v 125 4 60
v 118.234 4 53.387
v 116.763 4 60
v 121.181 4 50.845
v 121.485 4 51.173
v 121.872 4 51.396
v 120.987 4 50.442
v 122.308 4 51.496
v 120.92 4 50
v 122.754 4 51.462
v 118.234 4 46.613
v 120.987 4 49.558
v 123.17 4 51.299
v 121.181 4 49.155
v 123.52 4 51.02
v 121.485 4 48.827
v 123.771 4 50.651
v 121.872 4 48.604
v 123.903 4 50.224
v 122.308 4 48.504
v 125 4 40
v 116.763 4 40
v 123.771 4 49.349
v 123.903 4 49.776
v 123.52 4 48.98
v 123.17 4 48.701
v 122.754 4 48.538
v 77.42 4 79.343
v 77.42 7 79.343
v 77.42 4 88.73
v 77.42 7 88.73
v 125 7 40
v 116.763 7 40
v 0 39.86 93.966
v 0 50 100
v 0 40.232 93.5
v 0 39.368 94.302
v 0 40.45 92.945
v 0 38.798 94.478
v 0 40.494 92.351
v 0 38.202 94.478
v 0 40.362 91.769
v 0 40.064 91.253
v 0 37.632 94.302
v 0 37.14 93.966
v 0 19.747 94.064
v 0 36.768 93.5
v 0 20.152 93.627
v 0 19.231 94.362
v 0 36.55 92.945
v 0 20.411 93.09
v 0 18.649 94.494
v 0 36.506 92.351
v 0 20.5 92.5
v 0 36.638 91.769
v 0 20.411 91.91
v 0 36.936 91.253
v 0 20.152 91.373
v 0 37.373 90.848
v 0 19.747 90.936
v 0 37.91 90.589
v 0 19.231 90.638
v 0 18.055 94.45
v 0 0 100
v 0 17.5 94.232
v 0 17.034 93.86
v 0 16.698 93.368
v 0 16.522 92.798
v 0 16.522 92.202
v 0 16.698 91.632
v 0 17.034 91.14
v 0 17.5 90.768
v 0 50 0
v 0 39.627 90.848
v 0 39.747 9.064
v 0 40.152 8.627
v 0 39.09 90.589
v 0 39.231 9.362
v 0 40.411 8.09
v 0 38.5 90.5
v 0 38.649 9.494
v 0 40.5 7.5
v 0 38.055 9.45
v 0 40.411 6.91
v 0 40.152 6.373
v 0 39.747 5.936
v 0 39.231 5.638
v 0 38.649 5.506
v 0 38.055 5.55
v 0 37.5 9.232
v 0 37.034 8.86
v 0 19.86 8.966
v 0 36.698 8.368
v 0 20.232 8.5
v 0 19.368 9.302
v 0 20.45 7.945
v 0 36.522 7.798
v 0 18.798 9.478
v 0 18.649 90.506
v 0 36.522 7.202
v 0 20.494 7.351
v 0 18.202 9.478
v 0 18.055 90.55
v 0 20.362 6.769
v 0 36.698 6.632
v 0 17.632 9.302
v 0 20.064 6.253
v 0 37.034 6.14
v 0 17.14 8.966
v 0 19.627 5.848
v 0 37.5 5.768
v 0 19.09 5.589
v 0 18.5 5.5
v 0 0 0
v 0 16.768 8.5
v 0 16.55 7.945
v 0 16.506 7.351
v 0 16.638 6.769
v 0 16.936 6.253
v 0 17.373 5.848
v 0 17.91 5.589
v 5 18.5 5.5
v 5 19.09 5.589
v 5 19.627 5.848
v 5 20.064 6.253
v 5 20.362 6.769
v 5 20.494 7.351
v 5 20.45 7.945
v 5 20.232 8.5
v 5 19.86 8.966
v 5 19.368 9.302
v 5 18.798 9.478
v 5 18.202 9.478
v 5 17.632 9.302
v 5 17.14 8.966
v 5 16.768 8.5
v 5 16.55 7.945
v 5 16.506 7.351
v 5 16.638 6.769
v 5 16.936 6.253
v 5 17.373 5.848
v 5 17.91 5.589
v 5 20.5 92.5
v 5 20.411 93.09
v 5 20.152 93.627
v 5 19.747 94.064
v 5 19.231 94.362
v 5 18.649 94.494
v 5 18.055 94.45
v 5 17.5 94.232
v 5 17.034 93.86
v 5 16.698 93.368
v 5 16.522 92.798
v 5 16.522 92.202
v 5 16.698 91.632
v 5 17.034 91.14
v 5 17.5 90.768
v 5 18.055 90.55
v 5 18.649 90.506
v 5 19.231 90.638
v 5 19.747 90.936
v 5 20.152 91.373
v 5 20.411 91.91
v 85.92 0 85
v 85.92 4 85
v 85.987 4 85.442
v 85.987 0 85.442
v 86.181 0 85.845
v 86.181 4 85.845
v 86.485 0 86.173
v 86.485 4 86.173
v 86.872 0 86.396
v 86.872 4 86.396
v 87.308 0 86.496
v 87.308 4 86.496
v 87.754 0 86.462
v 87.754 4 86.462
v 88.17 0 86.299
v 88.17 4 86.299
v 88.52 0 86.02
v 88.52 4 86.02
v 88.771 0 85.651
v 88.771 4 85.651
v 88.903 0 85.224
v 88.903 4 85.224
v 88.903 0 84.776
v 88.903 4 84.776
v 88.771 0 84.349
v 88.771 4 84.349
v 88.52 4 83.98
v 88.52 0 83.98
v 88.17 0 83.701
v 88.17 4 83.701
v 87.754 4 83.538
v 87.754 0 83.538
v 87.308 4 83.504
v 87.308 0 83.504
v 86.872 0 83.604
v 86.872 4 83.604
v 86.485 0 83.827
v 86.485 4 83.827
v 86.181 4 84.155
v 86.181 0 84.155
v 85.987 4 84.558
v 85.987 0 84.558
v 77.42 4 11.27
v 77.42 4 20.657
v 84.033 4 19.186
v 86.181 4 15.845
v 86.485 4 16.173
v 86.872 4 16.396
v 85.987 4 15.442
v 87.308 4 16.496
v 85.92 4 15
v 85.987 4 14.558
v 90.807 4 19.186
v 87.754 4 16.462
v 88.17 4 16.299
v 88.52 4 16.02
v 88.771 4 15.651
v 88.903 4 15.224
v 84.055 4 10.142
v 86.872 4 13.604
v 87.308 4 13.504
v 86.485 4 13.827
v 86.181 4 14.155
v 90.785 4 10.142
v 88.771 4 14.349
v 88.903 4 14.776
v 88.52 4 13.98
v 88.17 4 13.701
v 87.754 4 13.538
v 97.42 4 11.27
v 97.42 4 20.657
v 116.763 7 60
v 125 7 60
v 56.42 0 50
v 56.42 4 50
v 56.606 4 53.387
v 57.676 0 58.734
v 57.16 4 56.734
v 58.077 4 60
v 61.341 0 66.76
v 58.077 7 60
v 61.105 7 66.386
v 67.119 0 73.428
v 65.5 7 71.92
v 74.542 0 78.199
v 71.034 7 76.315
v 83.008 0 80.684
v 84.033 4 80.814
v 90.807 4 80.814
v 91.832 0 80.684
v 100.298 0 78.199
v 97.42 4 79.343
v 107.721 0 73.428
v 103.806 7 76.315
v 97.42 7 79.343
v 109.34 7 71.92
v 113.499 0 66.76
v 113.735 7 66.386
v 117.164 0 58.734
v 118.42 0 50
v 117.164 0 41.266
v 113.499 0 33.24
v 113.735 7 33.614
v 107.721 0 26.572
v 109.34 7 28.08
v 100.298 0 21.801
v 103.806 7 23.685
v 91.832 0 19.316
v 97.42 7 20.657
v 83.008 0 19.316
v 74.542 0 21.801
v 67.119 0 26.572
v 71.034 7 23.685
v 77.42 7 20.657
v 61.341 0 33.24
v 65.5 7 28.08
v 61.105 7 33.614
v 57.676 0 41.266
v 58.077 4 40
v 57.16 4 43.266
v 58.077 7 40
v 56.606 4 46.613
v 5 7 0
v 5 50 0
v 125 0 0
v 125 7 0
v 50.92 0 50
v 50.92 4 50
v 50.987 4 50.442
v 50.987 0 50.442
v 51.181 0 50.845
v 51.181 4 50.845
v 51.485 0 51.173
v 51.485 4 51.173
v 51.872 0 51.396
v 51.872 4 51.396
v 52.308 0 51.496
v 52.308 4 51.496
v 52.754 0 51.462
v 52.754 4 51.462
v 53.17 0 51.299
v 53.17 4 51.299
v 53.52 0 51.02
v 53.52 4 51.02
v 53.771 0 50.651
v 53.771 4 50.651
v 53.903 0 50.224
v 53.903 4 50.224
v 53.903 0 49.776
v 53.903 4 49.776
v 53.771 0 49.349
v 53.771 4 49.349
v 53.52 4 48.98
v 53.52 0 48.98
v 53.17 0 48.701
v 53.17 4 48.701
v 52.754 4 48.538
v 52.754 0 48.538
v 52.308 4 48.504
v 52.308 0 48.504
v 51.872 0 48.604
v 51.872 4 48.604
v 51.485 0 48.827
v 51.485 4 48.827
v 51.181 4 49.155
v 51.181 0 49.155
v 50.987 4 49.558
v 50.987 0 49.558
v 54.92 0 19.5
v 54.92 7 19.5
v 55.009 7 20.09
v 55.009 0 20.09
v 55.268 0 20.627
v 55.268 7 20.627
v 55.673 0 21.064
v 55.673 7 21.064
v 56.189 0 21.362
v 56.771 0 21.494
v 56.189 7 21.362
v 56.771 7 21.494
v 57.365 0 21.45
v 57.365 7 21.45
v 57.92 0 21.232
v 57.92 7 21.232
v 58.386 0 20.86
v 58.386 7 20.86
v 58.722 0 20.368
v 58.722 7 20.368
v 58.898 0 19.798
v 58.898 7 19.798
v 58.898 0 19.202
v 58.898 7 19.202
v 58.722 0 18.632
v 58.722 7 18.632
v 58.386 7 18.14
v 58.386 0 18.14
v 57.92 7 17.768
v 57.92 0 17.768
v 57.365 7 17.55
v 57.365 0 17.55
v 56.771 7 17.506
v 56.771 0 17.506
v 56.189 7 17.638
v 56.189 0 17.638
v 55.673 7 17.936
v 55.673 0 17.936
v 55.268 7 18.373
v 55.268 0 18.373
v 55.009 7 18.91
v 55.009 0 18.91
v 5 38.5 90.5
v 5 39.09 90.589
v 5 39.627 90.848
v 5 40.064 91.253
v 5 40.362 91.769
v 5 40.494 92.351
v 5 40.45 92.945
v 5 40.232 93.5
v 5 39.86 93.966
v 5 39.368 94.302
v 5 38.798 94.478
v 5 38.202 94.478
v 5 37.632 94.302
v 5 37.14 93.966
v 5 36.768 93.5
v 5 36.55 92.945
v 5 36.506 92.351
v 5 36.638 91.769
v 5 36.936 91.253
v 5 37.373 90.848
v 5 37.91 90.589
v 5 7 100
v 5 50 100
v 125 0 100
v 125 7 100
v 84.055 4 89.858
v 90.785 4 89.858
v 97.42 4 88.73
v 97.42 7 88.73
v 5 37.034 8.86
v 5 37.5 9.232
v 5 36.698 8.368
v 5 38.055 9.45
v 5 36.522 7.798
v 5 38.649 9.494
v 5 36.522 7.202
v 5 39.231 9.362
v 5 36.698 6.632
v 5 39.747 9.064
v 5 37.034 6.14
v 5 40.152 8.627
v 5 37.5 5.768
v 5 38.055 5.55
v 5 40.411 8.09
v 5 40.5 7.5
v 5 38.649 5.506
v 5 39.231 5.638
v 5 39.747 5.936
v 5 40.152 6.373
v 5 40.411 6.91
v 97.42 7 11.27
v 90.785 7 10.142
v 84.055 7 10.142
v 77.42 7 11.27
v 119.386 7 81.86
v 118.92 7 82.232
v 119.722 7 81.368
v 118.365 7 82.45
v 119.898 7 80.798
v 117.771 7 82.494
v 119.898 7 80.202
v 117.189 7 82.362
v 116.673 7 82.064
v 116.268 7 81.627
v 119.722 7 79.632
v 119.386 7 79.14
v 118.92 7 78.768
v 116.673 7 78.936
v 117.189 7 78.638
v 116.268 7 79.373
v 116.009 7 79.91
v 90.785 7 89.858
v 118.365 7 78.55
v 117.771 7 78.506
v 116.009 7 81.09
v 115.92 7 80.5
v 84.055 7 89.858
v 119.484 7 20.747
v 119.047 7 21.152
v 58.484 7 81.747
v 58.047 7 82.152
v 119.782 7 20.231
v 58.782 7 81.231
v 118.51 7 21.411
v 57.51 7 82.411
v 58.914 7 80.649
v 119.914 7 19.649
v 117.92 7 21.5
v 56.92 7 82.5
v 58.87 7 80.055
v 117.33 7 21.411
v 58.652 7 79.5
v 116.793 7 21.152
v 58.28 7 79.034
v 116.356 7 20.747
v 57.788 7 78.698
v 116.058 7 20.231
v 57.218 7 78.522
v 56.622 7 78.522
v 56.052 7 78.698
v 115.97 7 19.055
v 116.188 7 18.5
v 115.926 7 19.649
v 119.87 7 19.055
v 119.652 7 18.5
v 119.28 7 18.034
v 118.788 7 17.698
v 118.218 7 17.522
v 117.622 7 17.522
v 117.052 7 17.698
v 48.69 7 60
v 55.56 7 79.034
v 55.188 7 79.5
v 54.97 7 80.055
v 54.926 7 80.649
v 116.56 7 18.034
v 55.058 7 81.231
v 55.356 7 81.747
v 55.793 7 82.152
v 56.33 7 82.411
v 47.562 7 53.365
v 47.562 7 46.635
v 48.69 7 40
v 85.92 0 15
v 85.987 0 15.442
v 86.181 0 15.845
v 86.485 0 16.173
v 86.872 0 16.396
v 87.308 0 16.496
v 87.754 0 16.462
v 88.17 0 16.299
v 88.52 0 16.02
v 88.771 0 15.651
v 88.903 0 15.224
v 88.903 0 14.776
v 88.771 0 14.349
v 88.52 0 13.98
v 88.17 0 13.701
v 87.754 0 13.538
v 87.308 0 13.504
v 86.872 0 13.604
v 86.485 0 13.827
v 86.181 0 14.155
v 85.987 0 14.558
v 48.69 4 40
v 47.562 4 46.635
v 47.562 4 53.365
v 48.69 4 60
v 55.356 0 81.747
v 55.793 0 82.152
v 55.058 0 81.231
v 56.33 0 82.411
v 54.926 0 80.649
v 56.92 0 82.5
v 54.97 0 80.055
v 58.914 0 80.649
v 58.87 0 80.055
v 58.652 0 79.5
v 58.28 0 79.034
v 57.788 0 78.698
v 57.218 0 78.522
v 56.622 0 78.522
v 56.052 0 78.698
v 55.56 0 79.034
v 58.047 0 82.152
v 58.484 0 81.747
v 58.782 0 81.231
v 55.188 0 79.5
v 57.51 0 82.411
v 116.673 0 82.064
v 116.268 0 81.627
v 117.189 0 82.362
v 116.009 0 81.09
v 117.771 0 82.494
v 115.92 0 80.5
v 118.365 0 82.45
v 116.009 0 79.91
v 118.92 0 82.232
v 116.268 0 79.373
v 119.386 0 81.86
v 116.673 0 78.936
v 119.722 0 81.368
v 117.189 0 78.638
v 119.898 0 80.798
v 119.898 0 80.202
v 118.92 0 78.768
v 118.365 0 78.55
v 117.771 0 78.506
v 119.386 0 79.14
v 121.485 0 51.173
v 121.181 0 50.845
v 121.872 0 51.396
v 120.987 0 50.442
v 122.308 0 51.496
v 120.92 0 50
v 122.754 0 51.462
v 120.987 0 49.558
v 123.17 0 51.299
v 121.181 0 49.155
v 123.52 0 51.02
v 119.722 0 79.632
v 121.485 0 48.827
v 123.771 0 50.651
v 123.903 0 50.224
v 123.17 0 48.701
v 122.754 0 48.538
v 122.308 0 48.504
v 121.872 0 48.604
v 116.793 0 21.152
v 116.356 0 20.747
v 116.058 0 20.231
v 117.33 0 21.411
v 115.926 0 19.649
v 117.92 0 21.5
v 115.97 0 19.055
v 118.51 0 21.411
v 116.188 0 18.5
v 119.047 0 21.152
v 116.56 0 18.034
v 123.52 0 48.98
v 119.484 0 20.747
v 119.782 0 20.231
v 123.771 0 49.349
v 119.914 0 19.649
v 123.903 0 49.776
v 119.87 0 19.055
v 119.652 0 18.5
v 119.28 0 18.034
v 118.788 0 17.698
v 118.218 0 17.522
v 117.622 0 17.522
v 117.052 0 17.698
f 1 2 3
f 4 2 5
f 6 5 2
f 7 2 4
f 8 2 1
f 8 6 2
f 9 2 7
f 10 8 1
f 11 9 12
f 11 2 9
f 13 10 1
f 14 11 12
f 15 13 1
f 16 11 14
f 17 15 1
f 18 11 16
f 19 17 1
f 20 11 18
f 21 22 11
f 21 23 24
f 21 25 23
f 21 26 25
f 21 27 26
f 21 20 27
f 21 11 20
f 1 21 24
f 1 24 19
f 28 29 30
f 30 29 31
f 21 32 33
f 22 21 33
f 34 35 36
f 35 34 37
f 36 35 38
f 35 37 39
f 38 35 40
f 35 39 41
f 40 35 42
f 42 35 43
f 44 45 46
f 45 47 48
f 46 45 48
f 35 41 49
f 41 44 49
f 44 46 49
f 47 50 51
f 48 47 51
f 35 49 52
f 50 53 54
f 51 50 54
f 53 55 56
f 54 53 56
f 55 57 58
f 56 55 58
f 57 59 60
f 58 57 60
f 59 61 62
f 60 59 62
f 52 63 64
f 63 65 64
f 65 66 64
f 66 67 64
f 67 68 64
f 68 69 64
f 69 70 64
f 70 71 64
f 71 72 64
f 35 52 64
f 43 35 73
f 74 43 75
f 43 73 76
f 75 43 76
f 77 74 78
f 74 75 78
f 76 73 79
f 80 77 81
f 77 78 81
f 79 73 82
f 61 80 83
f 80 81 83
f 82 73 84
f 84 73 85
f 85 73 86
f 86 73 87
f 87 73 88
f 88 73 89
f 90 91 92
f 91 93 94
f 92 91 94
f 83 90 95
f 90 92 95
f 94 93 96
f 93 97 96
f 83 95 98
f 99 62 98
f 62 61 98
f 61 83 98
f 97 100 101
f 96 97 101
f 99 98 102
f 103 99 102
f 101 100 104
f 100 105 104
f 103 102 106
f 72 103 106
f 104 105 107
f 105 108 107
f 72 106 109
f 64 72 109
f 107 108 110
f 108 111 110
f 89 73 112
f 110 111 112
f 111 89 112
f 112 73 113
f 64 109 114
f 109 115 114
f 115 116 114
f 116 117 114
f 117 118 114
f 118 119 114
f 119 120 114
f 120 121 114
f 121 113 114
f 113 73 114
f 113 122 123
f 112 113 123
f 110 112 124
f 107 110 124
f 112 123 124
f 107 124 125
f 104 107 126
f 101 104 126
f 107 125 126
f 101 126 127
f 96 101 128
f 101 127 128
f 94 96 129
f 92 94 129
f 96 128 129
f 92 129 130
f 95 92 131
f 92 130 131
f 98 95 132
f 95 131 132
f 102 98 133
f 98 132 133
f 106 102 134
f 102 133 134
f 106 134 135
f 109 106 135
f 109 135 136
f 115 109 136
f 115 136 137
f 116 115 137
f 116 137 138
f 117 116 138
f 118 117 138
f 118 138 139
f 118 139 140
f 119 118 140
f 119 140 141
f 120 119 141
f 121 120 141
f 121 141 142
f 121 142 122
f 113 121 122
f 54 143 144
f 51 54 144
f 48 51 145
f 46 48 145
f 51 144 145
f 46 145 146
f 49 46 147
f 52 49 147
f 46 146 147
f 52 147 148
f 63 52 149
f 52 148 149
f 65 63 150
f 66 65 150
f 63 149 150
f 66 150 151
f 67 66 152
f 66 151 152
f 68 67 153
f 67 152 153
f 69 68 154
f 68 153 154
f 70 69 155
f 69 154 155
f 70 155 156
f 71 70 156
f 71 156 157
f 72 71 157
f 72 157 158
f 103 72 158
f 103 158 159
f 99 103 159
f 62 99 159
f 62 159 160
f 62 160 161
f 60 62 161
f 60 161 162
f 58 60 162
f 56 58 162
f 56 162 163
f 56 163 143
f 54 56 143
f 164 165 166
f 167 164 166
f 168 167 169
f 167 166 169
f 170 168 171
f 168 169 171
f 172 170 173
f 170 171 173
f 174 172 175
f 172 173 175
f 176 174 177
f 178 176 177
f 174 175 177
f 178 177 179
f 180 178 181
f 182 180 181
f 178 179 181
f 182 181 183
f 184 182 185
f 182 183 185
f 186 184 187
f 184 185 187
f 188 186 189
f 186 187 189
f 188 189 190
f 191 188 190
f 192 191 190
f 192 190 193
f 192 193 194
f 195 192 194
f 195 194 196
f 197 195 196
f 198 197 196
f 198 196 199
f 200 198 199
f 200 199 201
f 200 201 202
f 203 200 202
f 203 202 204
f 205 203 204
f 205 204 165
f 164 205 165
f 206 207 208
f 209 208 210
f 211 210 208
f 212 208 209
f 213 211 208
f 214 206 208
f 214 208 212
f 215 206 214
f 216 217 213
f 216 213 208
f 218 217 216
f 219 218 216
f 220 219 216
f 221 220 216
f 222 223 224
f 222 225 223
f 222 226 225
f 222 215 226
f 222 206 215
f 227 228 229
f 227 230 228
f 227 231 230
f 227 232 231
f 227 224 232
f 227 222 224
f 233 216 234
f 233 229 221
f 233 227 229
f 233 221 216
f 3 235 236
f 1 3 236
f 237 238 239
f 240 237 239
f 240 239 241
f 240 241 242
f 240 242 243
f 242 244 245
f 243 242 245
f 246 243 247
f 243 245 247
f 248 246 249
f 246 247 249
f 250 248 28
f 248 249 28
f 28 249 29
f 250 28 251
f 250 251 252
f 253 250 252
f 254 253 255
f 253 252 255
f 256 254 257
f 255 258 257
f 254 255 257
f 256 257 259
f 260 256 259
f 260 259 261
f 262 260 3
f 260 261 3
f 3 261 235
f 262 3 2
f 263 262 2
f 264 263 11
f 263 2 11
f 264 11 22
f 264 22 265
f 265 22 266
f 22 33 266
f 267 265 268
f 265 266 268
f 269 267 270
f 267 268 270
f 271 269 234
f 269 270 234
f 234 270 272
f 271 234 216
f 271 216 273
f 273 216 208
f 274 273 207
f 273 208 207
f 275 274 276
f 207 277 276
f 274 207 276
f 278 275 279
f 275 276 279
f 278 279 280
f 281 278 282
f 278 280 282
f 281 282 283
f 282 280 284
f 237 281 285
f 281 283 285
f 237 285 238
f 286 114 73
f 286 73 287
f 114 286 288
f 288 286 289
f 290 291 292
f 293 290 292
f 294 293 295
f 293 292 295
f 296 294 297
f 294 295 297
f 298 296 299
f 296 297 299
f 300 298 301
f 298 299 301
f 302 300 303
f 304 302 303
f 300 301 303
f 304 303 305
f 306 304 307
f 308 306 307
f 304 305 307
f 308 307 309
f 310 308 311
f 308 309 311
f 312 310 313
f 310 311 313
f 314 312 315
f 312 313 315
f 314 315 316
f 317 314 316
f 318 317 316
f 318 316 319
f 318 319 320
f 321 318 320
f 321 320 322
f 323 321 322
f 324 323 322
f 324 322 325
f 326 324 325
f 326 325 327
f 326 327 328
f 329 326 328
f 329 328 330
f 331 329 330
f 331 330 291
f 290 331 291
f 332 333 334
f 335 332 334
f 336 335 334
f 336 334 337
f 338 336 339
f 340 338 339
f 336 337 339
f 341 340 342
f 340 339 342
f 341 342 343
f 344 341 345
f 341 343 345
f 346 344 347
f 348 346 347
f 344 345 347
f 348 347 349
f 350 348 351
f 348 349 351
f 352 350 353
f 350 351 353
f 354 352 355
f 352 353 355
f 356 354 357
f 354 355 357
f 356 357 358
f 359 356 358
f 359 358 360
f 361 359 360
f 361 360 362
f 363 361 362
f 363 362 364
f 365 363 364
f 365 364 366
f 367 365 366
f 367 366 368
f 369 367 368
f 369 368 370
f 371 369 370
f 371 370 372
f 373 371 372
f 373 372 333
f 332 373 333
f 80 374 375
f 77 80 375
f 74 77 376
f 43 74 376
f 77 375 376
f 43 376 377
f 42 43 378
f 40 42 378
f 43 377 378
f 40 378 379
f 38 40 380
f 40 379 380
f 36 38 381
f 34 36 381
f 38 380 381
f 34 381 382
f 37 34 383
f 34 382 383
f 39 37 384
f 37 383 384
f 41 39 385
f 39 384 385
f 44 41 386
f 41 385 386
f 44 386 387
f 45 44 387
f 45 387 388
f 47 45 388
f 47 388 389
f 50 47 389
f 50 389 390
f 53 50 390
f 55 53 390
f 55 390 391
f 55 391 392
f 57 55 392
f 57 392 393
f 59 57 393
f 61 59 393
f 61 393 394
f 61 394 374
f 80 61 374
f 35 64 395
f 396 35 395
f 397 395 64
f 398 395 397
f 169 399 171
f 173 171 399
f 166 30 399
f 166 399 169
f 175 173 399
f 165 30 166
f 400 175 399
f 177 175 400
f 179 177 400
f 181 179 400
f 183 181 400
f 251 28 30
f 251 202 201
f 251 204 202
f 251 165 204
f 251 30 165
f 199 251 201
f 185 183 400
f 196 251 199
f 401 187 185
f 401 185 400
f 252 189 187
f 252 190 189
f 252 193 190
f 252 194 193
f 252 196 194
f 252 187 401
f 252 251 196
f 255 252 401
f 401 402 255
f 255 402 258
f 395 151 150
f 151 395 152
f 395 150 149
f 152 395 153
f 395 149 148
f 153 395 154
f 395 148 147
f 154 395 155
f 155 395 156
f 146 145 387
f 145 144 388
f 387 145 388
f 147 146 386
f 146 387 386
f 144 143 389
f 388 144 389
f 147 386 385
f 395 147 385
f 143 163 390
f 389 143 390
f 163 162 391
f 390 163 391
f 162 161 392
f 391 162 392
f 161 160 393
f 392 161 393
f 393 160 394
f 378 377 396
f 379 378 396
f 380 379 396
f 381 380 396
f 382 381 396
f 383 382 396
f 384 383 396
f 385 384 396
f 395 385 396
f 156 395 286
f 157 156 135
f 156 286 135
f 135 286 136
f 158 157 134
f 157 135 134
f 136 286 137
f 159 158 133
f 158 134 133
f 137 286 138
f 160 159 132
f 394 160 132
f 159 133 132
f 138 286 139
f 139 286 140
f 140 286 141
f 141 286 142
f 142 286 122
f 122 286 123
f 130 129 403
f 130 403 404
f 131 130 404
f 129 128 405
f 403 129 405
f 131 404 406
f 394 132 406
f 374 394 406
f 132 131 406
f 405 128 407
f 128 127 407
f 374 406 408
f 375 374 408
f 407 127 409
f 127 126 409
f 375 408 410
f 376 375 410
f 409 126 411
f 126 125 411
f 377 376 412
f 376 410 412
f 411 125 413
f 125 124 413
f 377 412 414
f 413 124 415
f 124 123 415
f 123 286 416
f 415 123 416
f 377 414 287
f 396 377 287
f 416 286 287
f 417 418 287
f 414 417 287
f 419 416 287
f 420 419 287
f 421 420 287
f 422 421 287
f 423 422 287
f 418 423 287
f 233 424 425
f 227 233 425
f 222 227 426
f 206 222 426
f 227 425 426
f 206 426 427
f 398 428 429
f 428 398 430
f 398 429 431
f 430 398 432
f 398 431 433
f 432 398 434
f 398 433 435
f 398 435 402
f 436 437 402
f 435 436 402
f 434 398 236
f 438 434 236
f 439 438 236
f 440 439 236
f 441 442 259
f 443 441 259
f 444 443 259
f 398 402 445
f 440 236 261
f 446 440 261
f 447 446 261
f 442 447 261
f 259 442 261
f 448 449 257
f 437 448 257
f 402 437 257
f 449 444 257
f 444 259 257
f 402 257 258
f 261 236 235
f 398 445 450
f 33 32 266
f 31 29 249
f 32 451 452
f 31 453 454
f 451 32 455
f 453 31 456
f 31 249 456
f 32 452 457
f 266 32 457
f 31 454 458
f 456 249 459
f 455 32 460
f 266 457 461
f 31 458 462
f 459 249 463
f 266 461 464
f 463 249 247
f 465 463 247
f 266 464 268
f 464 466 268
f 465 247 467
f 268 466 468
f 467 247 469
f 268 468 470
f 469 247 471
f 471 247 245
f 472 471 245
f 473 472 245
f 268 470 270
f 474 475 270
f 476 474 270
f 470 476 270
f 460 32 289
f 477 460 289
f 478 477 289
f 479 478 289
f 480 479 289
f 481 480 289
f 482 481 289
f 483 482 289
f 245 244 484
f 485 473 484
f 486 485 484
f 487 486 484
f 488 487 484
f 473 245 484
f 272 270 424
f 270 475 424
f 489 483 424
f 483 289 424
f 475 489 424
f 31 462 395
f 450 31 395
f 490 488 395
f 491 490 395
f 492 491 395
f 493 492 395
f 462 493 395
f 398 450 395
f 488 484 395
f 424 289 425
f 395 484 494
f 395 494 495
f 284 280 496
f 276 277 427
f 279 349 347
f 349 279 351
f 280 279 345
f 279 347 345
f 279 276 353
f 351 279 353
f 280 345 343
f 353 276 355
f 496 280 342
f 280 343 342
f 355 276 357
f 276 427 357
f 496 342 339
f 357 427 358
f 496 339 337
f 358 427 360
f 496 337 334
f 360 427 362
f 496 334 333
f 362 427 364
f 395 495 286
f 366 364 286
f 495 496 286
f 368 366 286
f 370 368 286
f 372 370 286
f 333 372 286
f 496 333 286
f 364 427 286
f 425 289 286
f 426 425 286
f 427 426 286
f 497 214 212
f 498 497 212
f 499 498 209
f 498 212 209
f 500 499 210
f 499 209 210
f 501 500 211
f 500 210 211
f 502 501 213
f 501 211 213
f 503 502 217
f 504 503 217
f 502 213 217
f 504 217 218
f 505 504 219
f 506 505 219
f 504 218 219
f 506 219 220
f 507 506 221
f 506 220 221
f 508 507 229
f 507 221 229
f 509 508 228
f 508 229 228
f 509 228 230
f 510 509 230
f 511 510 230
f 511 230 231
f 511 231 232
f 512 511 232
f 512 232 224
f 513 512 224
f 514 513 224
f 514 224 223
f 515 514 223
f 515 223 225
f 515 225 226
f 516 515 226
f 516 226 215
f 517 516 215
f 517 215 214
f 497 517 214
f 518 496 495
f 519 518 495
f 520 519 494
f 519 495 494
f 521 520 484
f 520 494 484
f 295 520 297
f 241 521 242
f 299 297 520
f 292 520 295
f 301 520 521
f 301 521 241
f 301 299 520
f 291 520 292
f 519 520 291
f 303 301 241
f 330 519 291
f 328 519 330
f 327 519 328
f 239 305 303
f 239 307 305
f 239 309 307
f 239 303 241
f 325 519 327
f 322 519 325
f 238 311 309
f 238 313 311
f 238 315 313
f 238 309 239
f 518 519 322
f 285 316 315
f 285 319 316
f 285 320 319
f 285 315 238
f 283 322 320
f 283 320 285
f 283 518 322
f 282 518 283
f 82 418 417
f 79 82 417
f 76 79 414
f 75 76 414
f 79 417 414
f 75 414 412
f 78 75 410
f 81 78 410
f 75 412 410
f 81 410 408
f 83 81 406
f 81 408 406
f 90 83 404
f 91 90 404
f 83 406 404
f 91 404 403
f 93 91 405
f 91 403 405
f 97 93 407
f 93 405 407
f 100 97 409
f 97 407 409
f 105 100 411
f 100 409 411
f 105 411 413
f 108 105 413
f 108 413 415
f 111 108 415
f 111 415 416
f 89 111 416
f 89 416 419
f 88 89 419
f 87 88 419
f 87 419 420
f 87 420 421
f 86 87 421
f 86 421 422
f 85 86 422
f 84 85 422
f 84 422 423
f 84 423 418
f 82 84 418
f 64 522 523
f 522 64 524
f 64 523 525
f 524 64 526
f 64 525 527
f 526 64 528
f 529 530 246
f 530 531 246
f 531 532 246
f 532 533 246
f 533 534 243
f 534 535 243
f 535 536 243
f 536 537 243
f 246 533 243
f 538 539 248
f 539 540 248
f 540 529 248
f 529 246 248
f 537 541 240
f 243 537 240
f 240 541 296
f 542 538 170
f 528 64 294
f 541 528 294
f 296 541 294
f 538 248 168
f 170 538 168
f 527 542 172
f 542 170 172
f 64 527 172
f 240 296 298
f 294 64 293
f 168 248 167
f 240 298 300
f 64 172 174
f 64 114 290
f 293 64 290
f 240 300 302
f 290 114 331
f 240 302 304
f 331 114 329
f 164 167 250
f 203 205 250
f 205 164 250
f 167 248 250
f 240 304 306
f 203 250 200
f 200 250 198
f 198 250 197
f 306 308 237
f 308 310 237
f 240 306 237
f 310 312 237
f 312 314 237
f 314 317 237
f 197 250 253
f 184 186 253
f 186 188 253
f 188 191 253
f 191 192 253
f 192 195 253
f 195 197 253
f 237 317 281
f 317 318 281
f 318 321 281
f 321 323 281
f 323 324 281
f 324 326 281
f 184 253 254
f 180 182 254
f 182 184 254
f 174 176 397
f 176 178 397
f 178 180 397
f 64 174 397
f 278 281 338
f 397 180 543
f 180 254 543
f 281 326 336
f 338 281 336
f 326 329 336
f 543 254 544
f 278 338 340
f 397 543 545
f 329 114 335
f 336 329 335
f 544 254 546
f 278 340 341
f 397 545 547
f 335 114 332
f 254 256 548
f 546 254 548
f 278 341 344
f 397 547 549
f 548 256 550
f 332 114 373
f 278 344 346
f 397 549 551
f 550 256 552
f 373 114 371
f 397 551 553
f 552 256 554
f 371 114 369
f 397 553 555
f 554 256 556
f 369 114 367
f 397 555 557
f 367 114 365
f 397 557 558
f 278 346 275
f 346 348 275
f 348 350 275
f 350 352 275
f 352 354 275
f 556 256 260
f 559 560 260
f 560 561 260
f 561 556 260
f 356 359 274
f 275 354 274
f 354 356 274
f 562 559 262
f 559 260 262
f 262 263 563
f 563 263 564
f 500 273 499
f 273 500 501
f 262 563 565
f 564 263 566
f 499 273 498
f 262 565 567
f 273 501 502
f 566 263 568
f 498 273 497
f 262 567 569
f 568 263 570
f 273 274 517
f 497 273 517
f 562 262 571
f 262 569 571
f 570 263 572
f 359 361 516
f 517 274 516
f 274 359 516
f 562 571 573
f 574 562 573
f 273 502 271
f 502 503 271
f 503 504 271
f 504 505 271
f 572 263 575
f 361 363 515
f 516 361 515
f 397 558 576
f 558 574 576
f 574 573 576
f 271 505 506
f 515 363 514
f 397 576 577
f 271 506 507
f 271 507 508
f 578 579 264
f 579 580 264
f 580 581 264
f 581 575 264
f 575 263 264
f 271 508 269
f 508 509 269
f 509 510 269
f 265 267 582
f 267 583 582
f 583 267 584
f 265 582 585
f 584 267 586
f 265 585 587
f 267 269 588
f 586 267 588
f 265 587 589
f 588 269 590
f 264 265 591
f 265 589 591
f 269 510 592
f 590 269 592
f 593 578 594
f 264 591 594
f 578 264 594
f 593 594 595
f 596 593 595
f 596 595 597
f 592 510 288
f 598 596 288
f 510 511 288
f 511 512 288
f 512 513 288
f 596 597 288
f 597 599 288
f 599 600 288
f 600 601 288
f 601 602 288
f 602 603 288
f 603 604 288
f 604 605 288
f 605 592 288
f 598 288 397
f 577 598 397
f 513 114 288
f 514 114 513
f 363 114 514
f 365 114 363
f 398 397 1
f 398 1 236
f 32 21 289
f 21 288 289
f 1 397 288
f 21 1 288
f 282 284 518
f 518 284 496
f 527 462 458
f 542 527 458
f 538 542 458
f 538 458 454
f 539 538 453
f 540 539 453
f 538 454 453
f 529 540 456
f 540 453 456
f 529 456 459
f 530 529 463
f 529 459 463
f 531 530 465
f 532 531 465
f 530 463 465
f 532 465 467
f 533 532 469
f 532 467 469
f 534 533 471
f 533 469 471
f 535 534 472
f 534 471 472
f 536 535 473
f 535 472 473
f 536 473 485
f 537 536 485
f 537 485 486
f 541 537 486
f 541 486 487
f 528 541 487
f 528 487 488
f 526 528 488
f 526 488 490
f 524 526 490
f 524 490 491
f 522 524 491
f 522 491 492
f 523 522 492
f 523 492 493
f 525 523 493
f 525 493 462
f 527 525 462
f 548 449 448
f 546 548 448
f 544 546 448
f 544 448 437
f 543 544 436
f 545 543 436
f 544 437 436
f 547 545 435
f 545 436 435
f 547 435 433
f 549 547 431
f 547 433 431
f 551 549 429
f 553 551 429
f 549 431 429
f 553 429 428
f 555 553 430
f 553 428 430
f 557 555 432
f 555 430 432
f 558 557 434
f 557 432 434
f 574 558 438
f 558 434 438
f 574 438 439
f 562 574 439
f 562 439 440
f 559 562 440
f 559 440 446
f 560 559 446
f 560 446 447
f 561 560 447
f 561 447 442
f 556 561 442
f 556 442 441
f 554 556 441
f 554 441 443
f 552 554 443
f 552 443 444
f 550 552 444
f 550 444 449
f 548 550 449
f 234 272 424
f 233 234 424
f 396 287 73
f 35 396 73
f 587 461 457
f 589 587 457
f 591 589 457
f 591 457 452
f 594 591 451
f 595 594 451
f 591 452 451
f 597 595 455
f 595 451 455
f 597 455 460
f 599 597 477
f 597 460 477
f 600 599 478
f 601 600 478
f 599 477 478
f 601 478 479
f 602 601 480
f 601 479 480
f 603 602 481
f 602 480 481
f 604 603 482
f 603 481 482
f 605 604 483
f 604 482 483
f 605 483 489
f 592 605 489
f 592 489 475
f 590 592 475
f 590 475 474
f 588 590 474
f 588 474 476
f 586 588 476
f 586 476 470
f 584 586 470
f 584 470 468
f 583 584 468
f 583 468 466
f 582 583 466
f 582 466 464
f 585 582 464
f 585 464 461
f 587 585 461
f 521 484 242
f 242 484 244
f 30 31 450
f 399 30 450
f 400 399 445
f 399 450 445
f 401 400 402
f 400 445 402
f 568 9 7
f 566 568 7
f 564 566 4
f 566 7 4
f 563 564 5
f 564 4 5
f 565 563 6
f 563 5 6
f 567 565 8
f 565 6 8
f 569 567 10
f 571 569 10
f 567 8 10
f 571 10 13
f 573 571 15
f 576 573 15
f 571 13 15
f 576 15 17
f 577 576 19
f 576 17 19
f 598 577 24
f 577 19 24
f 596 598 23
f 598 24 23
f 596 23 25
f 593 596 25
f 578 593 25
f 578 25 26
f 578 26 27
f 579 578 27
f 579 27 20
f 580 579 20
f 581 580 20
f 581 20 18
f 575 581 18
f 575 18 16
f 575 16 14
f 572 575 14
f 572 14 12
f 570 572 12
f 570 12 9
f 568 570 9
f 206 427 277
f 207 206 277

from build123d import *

# Parameters (mm, degrees)
BOSS_EXTRUDE1_DEPTH = 100
CUT_EXTRUDE1_REACH  = 167.753
SKETCH2_R           = 31
SKETCH2_R_2         = 2
CUT_EXTRUDE2_REACH  = 166.012
SKETCH3_R           = 2
CUT_EXTRUDE3_DEPTH  = 3
CUT_EXTRUDE4_REACH  = 168.556
SKETCH6_R           = 1.5


with BuildPart() as part:
    # Sketch1 → Boss-Extrude1 (new body)
    with BuildSketch(Plane.XY):
        Polygon((0, 0), (125, 0), (125, 7), (5, 7), (5, 50), (0, 50), align=None)
    extrude(amount=BOSS_EXTRUDE1_DEPTH)

    # Sketch2 → Cut-Extrude1 (cut, up to next)
    with BuildSketch(Plane(origin=(0, 7, 0), x_dir=(1, 0, 0), z_dir=(0, 1, 0)), mode=Mode.PRIVATE) as cut_extrude1_sk1:
        with Locations(Location((87.42, -50, 0), (0, 0, 180))):
            Circle(SKETCH2_R)
    cut_extrude1_tool1 = extrude(cut_extrude1_sk1.sketch, amount=-CUT_EXTRUDE1_REACH, mode=Mode.PRIVATE) & part.part
    # Sketch2 → Cut-Extrude1 (cut, up to next)
    with BuildSketch(Plane(origin=(0, 7, 0), x_dir=(1, 0, 0), z_dir=(0, 1, 0)), mode=Mode.PRIVATE) as cut_extrude1_sk2:
        with Locations(Location((56.92, -19.5, 0), (0, 0, 180))):
            Circle(SKETCH2_R_2)
    cut_extrude1_tool2 = extrude(cut_extrude1_sk2.sketch, amount=-CUT_EXTRUDE1_REACH, mode=Mode.PRIVATE) & part.part
    # Sketch2 → Cut-Extrude1 (cut, up to next)
    with BuildSketch(Plane(origin=(0, 7, 0), x_dir=(1, 0, 0), z_dir=(0, 1, 0)), mode=Mode.PRIVATE) as cut_extrude1_sk3:
        with Locations(Location((56.92, -80.5, 0), (0, 0, 270))):
            Circle(SKETCH2_R_2)
    cut_extrude1_tool3 = extrude(cut_extrude1_sk3.sketch, amount=-CUT_EXTRUDE1_REACH, mode=Mode.PRIVATE) & part.part
    # Sketch2 → Cut-Extrude1 (cut, up to next)
    with BuildSketch(Plane(origin=(0, 7, 0), x_dir=(1, 0, 0), z_dir=(0, 1, 0)), mode=Mode.PRIVATE) as cut_extrude1_sk4:
        with Locations(Location((117.92, -19.5, 0), (0, 0, 270))):
            Circle(SKETCH2_R_2)
    cut_extrude1_tool4 = extrude(cut_extrude1_sk4.sketch, amount=-CUT_EXTRUDE1_REACH, mode=Mode.PRIVATE) & part.part
    # Sketch2 → Cut-Extrude1 (cut, up to next)
    with BuildSketch(Plane(origin=(0, 7, 0), x_dir=(1, 0, 0), z_dir=(0, 1, 0)), mode=Mode.PRIVATE) as cut_extrude1_sk5:
        with Locations(Location((117.92, -80.5, 0), (0, 0, 180))):
            Circle(SKETCH2_R_2)
    cut_extrude1_tool5 = extrude(cut_extrude1_sk5.sketch, amount=-CUT_EXTRUDE1_REACH, mode=Mode.PRIVATE) & part.part
    add(cut_extrude1_tool1.solids().sort_by_distance((87.42, 7, 50))[0], mode=Mode.SUBTRACT)
    add(cut_extrude1_tool2.solids().sort_by_distance((56.92, 7, 19.5))[0], mode=Mode.SUBTRACT)
    add(cut_extrude1_tool3.solids().sort_by_distance((56.92, 7, 80.5))[0], mode=Mode.SUBTRACT)
    add(cut_extrude1_tool4.solids().sort_by_distance((117.92, 7, 19.5))[0], mode=Mode.SUBTRACT)
    add(cut_extrude1_tool5.solids().sort_by_distance((117.92, 7, 80.5))[0], mode=Mode.SUBTRACT)

    # Sketch3 → Cut-Extrude2 (cut, up to next)
    with BuildSketch(Plane(origin=(5, 0, 0), x_dir=(0, 0, -1), z_dir=(1, 0, 0)), mode=Mode.PRIVATE) as cut_extrude2_sk1:
        with Locations((-92.5, 38.5)):
            Circle(SKETCH3_R)
    cut_extrude2_tool1 = extrude(cut_extrude2_sk1.sketch, amount=-CUT_EXTRUDE2_REACH, mode=Mode.PRIVATE) & part.part
    # Sketch3 → Cut-Extrude2 (cut, up to next)
    with BuildSketch(Plane(origin=(5, 0, 0), x_dir=(0, 0, -1), z_dir=(1, 0, 0)), mode=Mode.PRIVATE) as cut_extrude2_sk2:
        with Locations(Location((-92.5, 18.5, 0), (0, 0, 90))):
            Circle(SKETCH3_R)
    cut_extrude2_tool2 = extrude(cut_extrude2_sk2.sketch, amount=-CUT_EXTRUDE2_REACH, mode=Mode.PRIVATE) & part.part
    # Sketch3 → Cut-Extrude2 (cut, up to next)
    with BuildSketch(Plane(origin=(5, 0, 0), x_dir=(0, 0, -1), z_dir=(1, 0, 0)), mode=Mode.PRIVATE) as cut_extrude2_sk3:
        with Locations(Location((-7.5, 38.5, 0), (0, 0, 90))):
            Circle(SKETCH3_R)
    cut_extrude2_tool3 = extrude(cut_extrude2_sk3.sketch, amount=-CUT_EXTRUDE2_REACH, mode=Mode.PRIVATE) & part.part
    # Sketch3 → Cut-Extrude2 (cut, up to next)
    with BuildSketch(Plane(origin=(5, 0, 0), x_dir=(0, 0, -1), z_dir=(1, 0, 0)), mode=Mode.PRIVATE) as cut_extrude2_sk4:
        with Locations((-7.5, 18.5)):
            Circle(SKETCH3_R)
    cut_extrude2_tool4 = extrude(cut_extrude2_sk4.sketch, amount=-CUT_EXTRUDE2_REACH, mode=Mode.PRIVATE) & part.part
    add(cut_extrude2_tool1.solids().sort_by_distance((5, 38.5, 92.5))[0], mode=Mode.SUBTRACT)
    add(cut_extrude2_tool2.solids().sort_by_distance((5, 18.5, 92.5))[0], mode=Mode.SUBTRACT)
    add(cut_extrude2_tool3.solids().sort_by_distance((5, 38.5, 7.5))[0], mode=Mode.SUBTRACT)
    add(cut_extrude2_tool4.solids().sort_by_distance((5, 18.5, 7.5))[0], mode=Mode.SUBTRACT)

    # Sketch4 → Cut-Extrude3 (cut)
    with BuildSketch(Plane(origin=(0, 7, 0), x_dir=(1, 0, 0), z_dir=(0, 1, 0))):
        with BuildLine():
            Line((97.42, -20.657198498), (97.42, -11.270166538))
            ThreePointArc((97.42, -11.270166538), (87.42, -10), (77.42, -11.270166538))
            Line((77.42, -11.270166538), (77.42, -20.657198498))
            ThreePointArc((77.42, -20.657198498), (87.42, -19), (97.42, -20.657198498))
        make_face()
        with BuildLine():
            Line((116.762801502, -60), (126.149833462, -60))
            ThreePointArc((126.149833462, -60), (127.42, -50), (126.149833462, -40))
            Line((126.149833462, -40), (116.762801502, -40))
            ThreePointArc((116.762801502, -40), (118.42, -50), (116.762801502, -60))
        make_face()
        with BuildLine():
            Line((77.42, -79.342801502), (77.42, -88.729833462))
            ThreePointArc((77.42, -88.729833462), (87.42, -90), (97.42, -88.729833462))
            Line((97.42, -88.729833462), (97.42, -79.342801502))
            ThreePointArc((97.42, -79.342801502), (87.42, -81), (77.42, -79.342801502))
        make_face()
        with BuildLine():
            Line((58.077198498, -40), (48.690166538, -40))
            ThreePointArc((48.690166538, -40), (47.42, -50), (48.690166538, -60))
            Line((48.690166538, -60), (58.077198498, -60))
            ThreePointArc((58.077198498, -60), (56.42, -50), (58.077198498, -40))
        make_face()
    extrude(amount=-CUT_EXTRUDE3_DEPTH, mode=Mode.SUBTRACT)

    # Sketch6 → Cut-Extrude4 (cut, up to next)
    with BuildSketch(Plane(origin=(0, 4, 0), x_dir=(1, 0, 0), z_dir=(0, 1, 0)), mode=Mode.PRIVATE) as cut_extrude4_sk1:
        with Locations(Location((87.42, -15, 0), (0, 0, 180))):
            Circle(SKETCH6_R)
    cut_extrude4_tool1 = extrude(cut_extrude4_sk1.sketch, amount=-CUT_EXTRUDE4_REACH, mode=Mode.PRIVATE) & part.part
    # Sketch6 → Cut-Extrude4 (cut, up to next)
    with BuildSketch(Plane(origin=(0, 4, 0), x_dir=(1, 0, 0), z_dir=(0, 1, 0)), mode=Mode.PRIVATE) as cut_extrude4_sk2:
        with Locations(Location((122.42, -50, 0), (0, 0, 180))):
            Circle(SKETCH6_R)
    cut_extrude4_tool2 = extrude(cut_extrude4_sk2.sketch, amount=-CUT_EXTRUDE4_REACH, mode=Mode.PRIVATE) & part.part
    # Sketch6 → Cut-Extrude4 (cut, up to next)
    with BuildSketch(Plane(origin=(0, 4, 0), x_dir=(1, 0, 0), z_dir=(0, 1, 0)), mode=Mode.PRIVATE) as cut_extrude4_sk3:
        with Locations(Location((87.42, -85, 0), (0, 0, 180))):
            Circle(SKETCH6_R)
    cut_extrude4_tool3 = extrude(cut_extrude4_sk3.sketch, amount=-CUT_EXTRUDE4_REACH, mode=Mode.PRIVATE) & part.part
    # Sketch6 → Cut-Extrude4 (cut, up to next)
    with BuildSketch(Plane(origin=(0, 4, 0), x_dir=(1, 0, 0), z_dir=(0, 1, 0)), mode=Mode.PRIVATE) as cut_extrude4_sk4:
        with Locations(Location((52.42, -50, 0), (0, 0, 180))):
            Circle(SKETCH6_R)
    cut_extrude4_tool4 = extrude(cut_extrude4_sk4.sketch, amount=-CUT_EXTRUDE4_REACH, mode=Mode.PRIVATE) & part.part
    add(cut_extrude4_tool1.solids().sort_by_distance((87.42, 4, 15))[0], mode=Mode.SUBTRACT)
    add(cut_extrude4_tool2.solids().sort_by_distance((122.42, 4, 50))[0], mode=Mode.SUBTRACT)
    add(cut_extrude4_tool3.solids().sort_by_distance((87.42, 4, 85))[0], mode=Mode.SUBTRACT)
    add(cut_extrude4_tool4.solids().sort_by_distance((52.42, 4, 50))[0], mode=Mode.SUBTRACT)


solid = part.part
